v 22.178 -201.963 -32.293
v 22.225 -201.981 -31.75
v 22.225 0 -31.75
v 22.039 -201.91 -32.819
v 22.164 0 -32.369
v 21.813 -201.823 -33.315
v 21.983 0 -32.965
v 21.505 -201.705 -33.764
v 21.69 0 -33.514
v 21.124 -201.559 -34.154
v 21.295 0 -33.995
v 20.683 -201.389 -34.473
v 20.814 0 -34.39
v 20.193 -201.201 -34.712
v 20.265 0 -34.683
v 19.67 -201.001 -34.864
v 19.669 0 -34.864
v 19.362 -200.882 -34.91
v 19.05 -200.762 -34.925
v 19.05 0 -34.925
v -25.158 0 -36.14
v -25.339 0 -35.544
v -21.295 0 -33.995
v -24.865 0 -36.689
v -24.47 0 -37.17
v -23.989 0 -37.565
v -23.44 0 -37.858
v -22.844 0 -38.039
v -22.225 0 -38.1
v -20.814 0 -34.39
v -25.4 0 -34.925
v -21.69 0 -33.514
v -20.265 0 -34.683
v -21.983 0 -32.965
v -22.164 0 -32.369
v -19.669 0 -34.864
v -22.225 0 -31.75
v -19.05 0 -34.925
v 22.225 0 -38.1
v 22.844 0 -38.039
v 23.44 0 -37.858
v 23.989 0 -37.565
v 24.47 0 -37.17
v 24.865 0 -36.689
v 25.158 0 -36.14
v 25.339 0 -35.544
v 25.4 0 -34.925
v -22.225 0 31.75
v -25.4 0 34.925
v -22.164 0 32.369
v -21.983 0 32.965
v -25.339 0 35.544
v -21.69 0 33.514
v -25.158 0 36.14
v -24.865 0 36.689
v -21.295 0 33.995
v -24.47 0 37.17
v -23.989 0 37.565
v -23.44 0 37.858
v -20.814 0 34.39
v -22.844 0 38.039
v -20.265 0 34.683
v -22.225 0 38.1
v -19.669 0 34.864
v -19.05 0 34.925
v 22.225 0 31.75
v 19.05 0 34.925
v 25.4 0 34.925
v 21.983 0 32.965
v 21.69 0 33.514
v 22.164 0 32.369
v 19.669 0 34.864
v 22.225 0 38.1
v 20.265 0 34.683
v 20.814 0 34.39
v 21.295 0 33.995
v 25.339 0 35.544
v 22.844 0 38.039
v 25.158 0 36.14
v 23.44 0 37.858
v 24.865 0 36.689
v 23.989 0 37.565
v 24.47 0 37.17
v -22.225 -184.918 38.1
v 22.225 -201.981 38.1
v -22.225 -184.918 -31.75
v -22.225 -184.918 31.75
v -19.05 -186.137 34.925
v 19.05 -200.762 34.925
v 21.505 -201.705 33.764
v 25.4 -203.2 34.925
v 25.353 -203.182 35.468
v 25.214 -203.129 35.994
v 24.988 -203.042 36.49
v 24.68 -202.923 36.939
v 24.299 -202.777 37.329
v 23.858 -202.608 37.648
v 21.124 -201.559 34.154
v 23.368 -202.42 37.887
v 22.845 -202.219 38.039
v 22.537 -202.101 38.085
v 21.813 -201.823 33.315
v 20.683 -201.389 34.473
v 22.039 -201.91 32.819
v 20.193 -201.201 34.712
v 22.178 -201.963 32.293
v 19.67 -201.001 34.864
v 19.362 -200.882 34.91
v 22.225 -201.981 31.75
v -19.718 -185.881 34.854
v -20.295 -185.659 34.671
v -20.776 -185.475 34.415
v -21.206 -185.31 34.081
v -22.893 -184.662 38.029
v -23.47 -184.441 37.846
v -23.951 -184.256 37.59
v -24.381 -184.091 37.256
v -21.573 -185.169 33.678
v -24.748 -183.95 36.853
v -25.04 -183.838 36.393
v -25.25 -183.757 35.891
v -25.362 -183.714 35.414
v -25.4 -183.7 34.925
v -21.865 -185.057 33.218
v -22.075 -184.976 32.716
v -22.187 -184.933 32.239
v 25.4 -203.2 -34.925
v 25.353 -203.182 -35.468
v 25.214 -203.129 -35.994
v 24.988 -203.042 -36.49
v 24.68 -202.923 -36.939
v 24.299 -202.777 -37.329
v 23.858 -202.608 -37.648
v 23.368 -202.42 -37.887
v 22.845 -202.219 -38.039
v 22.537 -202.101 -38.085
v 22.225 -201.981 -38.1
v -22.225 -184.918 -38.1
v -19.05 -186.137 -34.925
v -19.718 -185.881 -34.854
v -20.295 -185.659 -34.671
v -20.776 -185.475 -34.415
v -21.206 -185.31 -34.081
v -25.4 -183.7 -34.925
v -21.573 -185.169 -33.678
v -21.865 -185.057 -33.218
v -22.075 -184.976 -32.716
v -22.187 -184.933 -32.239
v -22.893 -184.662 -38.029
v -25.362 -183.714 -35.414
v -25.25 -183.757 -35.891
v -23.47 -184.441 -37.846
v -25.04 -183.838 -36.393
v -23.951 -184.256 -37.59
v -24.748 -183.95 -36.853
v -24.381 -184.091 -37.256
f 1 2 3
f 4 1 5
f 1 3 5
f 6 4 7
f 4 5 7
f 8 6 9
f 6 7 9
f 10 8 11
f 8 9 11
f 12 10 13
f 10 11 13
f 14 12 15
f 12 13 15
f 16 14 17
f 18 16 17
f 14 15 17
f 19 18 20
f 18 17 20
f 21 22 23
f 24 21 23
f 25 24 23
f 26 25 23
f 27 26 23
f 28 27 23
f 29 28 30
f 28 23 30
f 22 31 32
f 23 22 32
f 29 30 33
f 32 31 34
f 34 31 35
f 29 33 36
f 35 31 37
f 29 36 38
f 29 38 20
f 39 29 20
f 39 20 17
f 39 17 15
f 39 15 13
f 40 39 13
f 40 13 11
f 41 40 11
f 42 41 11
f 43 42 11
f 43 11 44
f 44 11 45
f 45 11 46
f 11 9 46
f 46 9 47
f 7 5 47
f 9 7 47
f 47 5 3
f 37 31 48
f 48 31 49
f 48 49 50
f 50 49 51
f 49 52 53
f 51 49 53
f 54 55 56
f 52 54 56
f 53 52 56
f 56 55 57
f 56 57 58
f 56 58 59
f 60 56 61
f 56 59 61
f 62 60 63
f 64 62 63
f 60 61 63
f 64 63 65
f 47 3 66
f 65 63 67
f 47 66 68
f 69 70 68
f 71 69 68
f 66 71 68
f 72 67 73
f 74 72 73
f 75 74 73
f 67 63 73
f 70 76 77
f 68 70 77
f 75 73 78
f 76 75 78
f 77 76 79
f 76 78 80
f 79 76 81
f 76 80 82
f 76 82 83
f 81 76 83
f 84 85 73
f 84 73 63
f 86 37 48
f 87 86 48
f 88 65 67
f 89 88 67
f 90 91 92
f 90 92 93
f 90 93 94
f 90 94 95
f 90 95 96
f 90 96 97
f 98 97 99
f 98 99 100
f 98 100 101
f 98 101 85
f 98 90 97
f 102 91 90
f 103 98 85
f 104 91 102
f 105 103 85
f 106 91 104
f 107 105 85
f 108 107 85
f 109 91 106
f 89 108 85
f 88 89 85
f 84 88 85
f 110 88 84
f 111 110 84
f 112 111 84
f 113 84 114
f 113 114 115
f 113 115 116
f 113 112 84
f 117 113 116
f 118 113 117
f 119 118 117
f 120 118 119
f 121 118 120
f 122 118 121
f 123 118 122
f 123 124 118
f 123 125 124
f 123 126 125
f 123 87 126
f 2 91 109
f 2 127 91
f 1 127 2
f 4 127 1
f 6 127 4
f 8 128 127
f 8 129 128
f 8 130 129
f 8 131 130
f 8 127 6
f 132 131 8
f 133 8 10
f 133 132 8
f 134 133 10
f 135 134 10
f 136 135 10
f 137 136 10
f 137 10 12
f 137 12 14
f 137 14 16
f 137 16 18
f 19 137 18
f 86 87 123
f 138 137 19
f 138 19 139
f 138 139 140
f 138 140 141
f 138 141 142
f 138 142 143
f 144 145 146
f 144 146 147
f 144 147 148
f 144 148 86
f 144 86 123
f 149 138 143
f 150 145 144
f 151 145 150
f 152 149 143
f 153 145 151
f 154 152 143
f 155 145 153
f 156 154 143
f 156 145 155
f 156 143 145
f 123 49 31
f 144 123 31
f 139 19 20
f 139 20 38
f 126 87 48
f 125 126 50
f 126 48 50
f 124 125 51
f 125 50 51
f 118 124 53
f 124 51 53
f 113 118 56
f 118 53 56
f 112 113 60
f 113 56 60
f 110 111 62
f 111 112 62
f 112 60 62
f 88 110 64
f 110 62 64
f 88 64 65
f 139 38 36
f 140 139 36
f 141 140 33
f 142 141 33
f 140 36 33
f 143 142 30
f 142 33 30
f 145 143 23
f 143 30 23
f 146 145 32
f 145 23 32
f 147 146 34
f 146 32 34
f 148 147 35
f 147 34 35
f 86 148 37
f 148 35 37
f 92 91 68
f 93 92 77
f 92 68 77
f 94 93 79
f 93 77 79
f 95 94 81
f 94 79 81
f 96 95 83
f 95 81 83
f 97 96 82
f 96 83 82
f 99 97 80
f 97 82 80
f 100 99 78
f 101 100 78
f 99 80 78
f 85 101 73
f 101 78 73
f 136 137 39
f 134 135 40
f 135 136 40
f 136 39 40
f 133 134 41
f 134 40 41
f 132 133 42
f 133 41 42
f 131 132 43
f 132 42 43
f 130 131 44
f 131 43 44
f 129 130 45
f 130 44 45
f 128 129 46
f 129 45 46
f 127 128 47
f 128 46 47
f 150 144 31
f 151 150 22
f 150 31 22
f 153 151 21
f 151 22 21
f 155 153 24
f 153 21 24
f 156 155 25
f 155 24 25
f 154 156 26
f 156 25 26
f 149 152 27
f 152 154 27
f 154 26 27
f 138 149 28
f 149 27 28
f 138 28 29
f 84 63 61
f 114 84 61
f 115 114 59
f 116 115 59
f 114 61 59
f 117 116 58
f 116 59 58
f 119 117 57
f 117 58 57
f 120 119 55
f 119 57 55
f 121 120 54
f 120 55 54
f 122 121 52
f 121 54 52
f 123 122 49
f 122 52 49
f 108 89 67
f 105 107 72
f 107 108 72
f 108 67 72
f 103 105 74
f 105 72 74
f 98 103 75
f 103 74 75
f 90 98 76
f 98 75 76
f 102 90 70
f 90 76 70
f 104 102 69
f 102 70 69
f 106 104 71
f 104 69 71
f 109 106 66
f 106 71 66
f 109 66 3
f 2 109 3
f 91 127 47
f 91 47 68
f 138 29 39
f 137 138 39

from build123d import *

# Parameters (mm, degrees)
F1_DEPTH      = 203.2
F3_DEPTH      = 38.101
F3_DEPTH_BACK = 38.101


with BuildPart() as f1:
    # F0 (on Front) → F1 (new body)
    with BuildSketch(Plane.XZ):
        with BuildLine():
            ThreePointArc((25.4, 34.925), (24.4700640303, 37.1700640303), (22.225, 38.1))
            Line((22.225, 38.1), (-22.225, 38.1))
            ThreePointArc((-22.225, 38.1), (-24.4700640303, 37.1700640303), (-25.4, 34.925))
            Line((-25.4, 34.925), (-25.4, -34.925))
            ThreePointArc((-25.4, -34.925), (-24.4700640303, -37.1700640303), (-22.225, -38.1))
            Line((-22.225, -38.1), (22.225, -38.1))
            ThreePointArc((22.225, -38.1), (24.4700640303, -37.1700640303), (25.4, -34.925))
            Line((25.4, -34.925), (25.4, 34.925))
        make_face()
        with BuildLine():
            Line((-19.05, 34.925), (19.05, 34.925))
            ThreePointArc((19.05, 34.925), (21.2950640303, 33.9950640303), (22.225, 31.75))
            Line((22.225, 31.75), (22.225, -31.75))
            ThreePointArc((22.225, -31.75), (21.2950640303, -33.9950640303), (19.05, -34.925))
            Line((19.05, -34.925), (-19.05, -34.925))
            ThreePointArc((-19.05, -34.925), (-21.2950640303, -33.9950640303), (-22.225, -31.75))
            Line((-22.225, -31.75), (-22.225, 31.75))
            ThreePointArc((-22.225, 31.75), (-21.2950640303, 33.9950640303), (-19.05, 34.925))
        make_face(mode=Mode.SUBTRACT)
    extrude(amount=F1_DEPTH)

    # F2 (on Top) → F3 (cut, two sides)
    with BuildSketch(Plane.XY) as f3_sk:
        Polygon((-25.4, -203.2), (25.4, -203.2), (-25.4, -183.6997070202), align=None)
    extrude(amount=-F3_DEPTH, mode=Mode.SUBTRACT)
    extrude(f3_sk.sketch, amount=F3_DEPTH_BACK, mode=Mode.SUBTRACT)


solid = f1.part
